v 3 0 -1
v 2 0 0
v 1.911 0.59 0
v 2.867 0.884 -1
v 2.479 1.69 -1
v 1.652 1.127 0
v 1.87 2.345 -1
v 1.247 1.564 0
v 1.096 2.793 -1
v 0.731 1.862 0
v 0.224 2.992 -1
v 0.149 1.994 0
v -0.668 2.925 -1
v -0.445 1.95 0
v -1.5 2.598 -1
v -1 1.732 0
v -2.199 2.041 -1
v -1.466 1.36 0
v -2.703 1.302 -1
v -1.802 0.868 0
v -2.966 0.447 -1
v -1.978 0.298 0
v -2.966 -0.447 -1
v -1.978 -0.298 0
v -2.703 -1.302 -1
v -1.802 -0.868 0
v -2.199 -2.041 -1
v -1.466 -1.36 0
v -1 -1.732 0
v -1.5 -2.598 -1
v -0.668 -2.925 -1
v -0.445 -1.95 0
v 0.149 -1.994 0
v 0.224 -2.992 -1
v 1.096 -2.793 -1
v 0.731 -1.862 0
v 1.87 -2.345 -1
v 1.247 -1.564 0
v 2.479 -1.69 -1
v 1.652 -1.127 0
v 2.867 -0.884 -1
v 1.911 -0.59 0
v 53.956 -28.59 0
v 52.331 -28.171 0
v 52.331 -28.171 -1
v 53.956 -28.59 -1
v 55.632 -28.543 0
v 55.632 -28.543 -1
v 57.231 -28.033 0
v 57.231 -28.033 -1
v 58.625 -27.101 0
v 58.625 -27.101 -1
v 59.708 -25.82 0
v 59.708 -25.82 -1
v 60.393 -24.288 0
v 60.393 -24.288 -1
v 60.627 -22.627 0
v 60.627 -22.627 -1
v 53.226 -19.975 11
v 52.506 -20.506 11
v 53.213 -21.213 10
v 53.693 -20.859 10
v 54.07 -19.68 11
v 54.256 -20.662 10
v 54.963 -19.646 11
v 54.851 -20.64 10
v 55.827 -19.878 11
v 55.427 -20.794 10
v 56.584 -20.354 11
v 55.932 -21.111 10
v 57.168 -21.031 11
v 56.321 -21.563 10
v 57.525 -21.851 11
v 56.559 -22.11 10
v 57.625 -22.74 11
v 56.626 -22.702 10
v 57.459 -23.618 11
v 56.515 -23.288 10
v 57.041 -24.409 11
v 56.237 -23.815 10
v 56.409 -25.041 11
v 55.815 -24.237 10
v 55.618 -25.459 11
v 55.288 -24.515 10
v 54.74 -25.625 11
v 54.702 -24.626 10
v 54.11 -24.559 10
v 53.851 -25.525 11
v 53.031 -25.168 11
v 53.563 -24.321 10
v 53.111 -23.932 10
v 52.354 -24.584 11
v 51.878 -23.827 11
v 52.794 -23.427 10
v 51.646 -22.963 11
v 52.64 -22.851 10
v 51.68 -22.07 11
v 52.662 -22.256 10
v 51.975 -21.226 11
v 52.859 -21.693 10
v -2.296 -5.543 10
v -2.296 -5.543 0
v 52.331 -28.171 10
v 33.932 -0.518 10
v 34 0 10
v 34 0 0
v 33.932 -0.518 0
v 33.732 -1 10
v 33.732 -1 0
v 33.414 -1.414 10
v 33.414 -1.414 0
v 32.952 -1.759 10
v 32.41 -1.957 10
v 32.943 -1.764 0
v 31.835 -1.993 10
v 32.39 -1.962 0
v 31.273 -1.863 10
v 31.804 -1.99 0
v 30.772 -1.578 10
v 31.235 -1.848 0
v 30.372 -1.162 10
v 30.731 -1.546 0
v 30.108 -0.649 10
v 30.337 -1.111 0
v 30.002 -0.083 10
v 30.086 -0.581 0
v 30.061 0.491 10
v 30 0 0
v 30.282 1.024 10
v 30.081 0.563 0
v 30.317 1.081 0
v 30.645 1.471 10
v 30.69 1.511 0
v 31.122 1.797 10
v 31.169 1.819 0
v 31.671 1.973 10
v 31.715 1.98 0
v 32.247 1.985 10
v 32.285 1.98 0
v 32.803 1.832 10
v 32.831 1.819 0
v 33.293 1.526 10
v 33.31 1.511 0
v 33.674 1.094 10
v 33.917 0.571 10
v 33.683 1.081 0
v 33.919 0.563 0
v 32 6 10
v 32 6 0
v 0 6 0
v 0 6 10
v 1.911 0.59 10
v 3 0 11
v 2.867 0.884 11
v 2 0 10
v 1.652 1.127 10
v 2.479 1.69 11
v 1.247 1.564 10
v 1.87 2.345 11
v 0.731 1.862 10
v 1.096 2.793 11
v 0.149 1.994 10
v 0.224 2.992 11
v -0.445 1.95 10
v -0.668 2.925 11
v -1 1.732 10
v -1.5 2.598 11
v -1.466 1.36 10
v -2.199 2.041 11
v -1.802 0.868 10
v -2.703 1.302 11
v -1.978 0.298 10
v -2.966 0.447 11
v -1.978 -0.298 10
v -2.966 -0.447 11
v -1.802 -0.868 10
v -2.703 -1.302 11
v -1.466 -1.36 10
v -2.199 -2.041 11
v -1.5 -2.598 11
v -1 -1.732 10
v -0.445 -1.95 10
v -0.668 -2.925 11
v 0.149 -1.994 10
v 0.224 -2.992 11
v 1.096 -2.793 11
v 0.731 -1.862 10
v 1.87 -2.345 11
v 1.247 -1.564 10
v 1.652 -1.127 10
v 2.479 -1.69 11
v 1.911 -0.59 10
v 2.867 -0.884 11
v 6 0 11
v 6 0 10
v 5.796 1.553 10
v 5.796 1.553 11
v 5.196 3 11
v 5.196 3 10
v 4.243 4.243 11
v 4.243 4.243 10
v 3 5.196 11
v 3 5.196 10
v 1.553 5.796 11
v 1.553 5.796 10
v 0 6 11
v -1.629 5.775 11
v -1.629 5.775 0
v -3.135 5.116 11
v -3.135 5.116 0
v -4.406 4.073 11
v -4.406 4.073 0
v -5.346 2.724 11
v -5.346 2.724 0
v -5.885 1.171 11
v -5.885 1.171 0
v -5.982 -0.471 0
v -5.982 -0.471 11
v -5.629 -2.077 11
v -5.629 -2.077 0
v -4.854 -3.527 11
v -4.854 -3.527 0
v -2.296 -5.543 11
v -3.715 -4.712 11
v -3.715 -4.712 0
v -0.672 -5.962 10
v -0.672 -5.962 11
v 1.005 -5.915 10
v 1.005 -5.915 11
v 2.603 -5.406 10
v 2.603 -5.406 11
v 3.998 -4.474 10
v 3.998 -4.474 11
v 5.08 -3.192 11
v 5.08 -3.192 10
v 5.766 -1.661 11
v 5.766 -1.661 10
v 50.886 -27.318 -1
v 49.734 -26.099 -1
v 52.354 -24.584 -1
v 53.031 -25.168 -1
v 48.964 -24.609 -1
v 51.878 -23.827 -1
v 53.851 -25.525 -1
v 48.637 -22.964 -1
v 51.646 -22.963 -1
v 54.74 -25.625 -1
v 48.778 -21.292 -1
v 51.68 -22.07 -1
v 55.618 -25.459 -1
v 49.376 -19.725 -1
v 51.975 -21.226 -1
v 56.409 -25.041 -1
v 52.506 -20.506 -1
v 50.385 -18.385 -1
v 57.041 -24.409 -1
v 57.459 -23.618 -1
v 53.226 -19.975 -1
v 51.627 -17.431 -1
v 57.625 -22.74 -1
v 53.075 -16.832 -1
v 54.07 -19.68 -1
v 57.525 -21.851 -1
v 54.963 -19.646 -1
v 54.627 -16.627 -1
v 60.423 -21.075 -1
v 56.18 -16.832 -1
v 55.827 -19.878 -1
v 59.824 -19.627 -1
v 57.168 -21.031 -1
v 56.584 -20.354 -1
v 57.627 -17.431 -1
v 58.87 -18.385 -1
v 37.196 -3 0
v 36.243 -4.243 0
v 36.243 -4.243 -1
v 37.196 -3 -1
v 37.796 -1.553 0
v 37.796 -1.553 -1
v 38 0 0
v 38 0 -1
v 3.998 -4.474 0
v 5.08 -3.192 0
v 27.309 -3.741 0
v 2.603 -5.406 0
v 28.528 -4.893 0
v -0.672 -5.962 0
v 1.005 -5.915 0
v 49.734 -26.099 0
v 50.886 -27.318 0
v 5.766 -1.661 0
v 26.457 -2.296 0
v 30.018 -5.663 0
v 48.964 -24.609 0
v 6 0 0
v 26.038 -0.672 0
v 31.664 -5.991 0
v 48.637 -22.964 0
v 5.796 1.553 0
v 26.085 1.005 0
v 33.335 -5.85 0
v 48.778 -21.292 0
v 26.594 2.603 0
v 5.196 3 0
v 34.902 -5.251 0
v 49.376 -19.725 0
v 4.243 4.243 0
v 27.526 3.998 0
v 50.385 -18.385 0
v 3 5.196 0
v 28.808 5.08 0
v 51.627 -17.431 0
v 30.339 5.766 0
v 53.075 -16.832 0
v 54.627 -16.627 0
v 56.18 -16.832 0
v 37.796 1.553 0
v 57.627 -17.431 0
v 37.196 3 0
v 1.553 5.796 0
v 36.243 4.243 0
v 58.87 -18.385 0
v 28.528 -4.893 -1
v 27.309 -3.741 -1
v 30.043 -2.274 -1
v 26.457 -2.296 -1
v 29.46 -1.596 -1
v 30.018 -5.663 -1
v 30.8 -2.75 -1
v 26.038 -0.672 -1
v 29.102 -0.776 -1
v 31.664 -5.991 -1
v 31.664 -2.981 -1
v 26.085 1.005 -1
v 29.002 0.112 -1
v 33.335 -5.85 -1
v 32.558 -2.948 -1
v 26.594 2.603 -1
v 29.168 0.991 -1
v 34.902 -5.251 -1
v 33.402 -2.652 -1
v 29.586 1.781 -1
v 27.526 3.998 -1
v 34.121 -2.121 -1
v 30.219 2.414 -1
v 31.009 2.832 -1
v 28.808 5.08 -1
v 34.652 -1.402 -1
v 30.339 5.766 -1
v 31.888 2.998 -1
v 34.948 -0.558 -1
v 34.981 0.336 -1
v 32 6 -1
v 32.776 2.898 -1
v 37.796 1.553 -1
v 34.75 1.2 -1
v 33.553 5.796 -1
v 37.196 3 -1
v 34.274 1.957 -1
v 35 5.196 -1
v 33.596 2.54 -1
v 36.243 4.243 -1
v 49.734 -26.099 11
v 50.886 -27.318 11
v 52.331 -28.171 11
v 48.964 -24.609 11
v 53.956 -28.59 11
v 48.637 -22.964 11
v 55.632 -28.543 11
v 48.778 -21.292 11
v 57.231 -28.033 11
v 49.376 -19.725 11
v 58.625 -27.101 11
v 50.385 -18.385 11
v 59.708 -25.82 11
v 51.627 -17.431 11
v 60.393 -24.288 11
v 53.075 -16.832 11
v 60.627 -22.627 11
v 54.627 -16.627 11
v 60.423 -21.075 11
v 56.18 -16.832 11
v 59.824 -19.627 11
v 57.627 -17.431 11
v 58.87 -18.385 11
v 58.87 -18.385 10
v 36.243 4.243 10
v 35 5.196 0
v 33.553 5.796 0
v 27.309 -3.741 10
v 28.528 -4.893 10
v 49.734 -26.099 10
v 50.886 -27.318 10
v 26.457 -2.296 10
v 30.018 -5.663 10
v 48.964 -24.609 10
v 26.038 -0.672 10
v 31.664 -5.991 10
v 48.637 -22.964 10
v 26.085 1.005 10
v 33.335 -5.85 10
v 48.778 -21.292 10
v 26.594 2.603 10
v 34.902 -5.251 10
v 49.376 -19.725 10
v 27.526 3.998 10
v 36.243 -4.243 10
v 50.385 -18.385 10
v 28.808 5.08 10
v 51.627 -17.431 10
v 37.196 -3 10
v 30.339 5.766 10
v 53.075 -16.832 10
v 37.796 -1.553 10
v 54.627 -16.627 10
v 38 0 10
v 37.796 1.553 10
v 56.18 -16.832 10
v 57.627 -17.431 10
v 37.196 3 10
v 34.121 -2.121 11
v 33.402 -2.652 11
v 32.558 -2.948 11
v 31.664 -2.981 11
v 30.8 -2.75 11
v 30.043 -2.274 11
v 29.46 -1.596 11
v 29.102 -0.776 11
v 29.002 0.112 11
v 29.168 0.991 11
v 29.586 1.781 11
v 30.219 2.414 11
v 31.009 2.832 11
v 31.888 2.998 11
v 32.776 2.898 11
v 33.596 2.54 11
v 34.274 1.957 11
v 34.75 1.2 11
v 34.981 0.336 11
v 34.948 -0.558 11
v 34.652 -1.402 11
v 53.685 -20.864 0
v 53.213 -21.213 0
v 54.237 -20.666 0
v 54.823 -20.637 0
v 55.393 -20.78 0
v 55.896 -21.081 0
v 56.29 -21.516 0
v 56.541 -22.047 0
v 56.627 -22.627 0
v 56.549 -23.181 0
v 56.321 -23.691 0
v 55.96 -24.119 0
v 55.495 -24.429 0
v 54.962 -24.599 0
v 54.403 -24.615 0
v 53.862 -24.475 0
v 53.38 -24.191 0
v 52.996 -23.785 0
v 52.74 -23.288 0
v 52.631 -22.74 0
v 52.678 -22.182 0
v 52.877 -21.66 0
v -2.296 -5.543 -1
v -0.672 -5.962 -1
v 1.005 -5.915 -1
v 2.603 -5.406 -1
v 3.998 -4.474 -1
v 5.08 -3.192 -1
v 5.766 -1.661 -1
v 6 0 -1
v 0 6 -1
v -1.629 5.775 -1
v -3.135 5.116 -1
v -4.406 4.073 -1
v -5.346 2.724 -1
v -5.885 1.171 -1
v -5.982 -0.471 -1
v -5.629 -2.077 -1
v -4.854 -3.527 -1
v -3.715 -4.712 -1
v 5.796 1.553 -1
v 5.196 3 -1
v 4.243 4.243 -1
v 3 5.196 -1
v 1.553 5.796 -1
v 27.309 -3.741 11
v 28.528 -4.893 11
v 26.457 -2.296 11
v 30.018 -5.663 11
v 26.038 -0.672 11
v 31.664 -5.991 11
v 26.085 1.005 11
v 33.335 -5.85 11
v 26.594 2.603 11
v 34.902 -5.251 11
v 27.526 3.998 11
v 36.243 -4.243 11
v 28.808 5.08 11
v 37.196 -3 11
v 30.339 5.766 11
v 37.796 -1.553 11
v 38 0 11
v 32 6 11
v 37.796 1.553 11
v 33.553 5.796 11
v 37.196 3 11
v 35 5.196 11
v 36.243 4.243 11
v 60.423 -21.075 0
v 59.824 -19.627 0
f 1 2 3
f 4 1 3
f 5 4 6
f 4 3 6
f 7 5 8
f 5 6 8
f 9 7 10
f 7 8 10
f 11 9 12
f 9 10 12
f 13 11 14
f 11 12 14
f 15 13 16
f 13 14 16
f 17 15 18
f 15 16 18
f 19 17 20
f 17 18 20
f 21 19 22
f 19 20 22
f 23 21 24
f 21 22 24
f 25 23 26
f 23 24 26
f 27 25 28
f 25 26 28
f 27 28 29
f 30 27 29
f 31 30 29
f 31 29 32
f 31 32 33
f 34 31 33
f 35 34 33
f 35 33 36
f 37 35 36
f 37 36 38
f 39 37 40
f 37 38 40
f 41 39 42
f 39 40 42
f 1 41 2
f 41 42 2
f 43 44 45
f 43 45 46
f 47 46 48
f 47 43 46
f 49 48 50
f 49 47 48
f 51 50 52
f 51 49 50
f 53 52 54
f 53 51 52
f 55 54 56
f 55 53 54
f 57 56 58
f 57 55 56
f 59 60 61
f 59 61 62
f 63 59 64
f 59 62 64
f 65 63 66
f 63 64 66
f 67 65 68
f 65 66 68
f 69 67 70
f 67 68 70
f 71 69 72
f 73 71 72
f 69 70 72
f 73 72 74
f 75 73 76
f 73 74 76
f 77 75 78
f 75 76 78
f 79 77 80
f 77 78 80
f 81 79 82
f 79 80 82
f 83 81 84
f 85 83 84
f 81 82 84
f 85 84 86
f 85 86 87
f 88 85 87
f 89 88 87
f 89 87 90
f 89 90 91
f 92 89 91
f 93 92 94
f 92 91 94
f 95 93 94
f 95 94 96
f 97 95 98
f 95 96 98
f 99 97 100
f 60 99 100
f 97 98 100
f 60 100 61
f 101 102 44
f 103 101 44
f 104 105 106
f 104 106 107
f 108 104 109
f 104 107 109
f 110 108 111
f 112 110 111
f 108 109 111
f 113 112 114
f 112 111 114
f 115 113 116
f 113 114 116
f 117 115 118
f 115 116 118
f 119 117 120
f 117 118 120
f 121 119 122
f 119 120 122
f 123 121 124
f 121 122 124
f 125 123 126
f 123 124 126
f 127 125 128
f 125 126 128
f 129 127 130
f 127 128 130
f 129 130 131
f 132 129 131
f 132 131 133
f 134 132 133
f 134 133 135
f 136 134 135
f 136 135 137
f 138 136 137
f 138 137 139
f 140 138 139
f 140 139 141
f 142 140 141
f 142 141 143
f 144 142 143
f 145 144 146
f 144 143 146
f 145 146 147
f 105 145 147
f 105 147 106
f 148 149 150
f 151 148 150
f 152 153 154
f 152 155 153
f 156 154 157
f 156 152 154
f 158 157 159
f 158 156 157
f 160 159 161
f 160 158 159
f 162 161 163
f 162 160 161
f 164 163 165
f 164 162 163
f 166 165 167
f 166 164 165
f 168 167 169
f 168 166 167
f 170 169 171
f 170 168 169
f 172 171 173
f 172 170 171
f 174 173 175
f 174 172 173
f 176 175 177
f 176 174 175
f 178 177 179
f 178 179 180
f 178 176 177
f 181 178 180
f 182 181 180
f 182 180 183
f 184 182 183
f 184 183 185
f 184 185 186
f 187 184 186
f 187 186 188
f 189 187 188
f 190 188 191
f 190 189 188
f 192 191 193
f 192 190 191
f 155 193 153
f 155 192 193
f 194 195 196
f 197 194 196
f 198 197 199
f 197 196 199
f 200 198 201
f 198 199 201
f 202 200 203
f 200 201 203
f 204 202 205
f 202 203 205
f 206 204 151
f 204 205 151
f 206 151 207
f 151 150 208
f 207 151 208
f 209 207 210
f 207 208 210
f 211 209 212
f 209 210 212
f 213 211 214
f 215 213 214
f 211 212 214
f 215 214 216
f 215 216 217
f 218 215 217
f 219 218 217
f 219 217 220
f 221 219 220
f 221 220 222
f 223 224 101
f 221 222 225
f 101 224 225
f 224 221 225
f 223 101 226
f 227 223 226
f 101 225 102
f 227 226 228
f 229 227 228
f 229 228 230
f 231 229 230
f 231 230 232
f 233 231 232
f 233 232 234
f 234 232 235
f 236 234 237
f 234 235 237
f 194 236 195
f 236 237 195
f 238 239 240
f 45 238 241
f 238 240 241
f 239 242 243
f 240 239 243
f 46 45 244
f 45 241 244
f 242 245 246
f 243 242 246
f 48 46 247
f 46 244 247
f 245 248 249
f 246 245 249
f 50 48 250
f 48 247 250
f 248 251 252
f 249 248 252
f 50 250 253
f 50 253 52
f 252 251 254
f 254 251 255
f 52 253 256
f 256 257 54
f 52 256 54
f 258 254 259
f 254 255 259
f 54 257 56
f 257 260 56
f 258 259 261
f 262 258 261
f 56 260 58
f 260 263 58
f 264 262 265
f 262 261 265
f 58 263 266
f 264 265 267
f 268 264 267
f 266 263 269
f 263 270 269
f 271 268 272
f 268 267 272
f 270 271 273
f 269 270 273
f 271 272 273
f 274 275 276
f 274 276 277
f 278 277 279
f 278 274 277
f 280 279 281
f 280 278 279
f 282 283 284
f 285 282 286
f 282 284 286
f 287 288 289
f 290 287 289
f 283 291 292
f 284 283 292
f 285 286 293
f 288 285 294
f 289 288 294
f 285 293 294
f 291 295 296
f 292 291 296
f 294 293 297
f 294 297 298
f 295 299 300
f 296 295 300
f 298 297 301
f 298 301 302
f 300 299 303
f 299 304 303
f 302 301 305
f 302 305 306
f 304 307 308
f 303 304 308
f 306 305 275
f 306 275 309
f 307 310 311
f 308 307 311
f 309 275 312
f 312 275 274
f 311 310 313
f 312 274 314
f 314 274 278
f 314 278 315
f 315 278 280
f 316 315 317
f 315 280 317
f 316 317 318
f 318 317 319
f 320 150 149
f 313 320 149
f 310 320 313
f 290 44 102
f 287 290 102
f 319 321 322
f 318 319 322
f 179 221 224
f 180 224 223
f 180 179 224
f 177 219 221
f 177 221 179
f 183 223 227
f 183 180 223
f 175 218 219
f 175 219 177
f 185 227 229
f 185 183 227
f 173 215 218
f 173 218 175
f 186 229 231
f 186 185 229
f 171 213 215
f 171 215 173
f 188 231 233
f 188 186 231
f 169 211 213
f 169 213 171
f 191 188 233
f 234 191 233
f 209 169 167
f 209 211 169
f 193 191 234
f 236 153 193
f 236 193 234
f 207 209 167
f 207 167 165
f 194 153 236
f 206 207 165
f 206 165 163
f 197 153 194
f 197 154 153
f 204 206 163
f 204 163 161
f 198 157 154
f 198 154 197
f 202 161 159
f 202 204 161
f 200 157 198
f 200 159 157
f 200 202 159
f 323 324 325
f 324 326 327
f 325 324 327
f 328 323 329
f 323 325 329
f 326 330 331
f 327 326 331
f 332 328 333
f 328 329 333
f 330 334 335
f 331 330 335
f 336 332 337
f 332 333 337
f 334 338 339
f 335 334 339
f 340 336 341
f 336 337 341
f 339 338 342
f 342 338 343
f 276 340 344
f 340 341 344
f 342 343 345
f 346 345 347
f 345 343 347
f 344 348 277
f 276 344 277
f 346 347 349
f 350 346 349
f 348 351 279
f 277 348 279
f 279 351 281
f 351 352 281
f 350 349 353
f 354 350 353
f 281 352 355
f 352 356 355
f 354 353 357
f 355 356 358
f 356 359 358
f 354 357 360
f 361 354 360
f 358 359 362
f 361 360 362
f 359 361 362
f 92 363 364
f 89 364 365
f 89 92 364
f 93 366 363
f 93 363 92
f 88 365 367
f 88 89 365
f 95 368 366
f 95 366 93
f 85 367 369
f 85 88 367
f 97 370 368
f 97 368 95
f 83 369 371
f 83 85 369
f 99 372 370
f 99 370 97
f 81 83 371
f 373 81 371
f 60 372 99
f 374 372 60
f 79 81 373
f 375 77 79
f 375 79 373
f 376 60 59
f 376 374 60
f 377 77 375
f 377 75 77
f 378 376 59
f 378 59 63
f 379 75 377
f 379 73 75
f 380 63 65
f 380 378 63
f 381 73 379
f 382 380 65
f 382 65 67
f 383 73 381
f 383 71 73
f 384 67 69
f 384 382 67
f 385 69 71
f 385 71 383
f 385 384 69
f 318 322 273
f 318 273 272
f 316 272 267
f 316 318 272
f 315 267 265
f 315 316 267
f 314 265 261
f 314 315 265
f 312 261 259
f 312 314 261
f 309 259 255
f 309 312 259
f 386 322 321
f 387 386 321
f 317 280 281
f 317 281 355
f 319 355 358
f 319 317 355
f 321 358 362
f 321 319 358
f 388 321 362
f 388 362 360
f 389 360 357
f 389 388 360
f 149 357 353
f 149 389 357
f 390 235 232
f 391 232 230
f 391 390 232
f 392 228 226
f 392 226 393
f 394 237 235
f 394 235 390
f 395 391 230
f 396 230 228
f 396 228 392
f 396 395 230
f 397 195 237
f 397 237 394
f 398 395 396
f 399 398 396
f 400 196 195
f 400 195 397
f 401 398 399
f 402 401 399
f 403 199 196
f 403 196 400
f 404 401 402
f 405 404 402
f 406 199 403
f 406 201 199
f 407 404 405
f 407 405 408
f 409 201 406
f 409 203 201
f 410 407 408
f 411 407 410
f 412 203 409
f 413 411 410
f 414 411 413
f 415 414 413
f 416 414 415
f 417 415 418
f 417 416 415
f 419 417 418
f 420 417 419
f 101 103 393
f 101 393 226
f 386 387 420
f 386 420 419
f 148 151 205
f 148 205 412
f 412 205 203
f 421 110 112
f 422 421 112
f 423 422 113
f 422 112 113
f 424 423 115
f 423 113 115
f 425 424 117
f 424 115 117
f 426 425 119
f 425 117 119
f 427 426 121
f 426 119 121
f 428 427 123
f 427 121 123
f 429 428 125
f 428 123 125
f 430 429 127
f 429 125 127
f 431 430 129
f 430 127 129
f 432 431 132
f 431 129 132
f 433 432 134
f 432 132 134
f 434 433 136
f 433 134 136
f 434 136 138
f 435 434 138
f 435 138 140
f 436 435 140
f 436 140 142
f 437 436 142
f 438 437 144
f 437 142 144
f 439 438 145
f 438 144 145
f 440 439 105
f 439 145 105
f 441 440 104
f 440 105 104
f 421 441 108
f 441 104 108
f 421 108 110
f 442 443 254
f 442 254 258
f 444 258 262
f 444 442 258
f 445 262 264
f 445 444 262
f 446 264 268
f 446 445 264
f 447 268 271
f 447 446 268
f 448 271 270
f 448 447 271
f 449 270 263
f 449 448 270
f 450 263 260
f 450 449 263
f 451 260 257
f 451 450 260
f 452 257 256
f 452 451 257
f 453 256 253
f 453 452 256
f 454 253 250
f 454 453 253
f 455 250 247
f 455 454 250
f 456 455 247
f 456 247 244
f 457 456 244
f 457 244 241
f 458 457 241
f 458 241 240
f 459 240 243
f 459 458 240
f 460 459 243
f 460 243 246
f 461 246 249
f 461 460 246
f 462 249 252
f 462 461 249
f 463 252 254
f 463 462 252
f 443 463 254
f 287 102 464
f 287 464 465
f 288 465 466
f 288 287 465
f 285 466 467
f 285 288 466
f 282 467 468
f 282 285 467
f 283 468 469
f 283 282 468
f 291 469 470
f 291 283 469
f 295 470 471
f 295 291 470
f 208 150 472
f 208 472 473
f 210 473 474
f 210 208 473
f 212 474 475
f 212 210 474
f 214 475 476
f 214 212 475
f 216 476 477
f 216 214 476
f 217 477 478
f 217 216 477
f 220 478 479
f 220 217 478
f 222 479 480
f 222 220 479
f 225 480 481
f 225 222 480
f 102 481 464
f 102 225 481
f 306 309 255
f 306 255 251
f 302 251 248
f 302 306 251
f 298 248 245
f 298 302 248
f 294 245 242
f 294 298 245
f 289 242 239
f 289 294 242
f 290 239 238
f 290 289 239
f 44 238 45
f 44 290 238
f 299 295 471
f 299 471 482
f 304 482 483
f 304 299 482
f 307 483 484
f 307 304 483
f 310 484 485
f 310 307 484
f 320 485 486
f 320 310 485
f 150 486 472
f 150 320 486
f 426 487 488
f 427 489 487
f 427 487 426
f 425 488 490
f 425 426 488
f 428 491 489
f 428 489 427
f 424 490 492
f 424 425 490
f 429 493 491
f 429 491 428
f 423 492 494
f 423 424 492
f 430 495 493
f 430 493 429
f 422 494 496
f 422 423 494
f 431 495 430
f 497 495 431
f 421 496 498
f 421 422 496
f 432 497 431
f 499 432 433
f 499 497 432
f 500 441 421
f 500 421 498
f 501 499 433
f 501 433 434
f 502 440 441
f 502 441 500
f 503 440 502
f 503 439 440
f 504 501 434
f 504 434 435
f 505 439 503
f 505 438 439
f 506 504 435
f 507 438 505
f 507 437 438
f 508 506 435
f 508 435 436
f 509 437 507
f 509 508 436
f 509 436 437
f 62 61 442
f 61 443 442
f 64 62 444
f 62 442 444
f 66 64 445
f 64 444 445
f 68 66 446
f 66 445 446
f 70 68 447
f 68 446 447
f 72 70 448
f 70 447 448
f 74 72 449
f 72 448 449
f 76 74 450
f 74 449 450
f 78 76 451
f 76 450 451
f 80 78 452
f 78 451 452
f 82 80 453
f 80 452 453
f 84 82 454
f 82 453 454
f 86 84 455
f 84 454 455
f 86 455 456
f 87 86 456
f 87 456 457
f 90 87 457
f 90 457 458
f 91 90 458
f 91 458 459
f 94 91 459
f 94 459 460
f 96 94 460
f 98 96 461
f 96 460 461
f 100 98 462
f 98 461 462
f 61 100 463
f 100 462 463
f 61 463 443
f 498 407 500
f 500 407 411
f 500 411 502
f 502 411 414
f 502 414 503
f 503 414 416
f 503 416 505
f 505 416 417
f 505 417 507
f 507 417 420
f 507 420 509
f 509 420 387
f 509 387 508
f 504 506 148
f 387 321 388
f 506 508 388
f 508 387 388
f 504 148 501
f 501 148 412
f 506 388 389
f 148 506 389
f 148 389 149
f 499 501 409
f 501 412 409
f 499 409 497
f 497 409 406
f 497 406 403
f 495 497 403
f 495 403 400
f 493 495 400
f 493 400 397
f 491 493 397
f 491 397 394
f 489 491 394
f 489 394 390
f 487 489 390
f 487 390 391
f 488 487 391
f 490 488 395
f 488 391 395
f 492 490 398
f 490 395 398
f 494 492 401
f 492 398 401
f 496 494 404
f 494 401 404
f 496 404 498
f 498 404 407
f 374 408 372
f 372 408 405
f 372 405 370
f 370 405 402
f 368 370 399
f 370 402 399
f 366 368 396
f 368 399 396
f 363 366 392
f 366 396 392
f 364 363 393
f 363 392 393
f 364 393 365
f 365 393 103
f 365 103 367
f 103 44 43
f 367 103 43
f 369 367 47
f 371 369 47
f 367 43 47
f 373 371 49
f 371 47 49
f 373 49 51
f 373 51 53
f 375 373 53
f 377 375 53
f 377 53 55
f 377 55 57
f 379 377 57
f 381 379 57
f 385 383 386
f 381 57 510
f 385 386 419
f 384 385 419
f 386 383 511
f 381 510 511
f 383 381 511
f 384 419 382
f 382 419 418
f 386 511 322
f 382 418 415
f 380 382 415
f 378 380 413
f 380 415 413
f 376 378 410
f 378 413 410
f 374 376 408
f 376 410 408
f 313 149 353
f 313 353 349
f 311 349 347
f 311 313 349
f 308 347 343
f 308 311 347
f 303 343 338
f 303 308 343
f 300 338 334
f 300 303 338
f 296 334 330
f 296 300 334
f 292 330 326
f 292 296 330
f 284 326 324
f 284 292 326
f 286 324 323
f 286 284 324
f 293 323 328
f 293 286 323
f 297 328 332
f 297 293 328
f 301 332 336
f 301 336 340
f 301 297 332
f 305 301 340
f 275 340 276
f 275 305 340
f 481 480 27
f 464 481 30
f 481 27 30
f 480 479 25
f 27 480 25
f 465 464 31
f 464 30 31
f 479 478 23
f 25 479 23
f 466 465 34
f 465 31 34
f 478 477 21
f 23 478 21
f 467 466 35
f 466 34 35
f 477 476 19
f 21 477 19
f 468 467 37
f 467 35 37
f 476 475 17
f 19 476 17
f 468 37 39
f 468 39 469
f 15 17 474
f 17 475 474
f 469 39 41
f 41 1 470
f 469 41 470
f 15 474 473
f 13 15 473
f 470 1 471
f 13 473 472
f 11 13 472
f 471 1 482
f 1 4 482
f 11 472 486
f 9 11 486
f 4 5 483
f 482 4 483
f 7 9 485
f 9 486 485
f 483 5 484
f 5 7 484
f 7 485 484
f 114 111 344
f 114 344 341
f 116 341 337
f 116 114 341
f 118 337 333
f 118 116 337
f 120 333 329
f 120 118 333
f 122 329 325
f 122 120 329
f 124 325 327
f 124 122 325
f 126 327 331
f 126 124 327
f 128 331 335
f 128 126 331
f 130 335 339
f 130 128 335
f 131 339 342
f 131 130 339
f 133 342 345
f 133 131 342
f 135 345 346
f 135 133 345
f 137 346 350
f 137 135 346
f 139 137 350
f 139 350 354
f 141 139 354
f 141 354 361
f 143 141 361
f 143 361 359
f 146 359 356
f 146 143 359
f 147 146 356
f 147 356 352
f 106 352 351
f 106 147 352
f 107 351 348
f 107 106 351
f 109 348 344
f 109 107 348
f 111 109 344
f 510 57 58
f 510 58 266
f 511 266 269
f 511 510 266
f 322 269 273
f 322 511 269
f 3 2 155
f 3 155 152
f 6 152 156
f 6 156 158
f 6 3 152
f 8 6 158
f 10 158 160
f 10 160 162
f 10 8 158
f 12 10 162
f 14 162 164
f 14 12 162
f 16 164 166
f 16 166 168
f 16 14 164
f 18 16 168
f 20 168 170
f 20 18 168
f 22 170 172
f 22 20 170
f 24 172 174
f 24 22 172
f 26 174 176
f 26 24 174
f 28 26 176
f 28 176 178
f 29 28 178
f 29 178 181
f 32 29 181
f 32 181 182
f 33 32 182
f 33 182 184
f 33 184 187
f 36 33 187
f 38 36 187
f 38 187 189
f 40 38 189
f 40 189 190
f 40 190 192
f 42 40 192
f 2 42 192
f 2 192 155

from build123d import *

# Parameters (mm, degrees)
F0_R     = 2
F1_DEPTH = 10
F2_DEPTH = 11
F3_DEPTH = 1


# Not quite as in the source:
# - a fillet or chamfer that OpenCascade refuses, or shapes differently, is made with other operations: its cross-section is extruded or revolved along the edge and cut away or added
# - after a boolean that leaves OpenCascade's solid faulty, fix() repairs it


with BuildPart() as f1:
    # F0 (on Top) → F1 (new body)
    with BuildSketch(Plane.XY):
        with BuildLine():
            Line((26, 0), (6, 0))
            ThreePointArc((6, 0), (3.3334213981, -4.9888176738), (-2.2961005942, -5.5432771951))
            Line((-2.2961005942, -5.5432771951), (52.3313164038, -28.170694193))
            ThreePointArc((52.3313164038, -28.170694193), (48.7427053156, -23.7979589301), (50.3847763109, -18.3847763109))
            Line((50.3847763109, -18.3847763109), (36.2426406871, -4.2426406871))
            ThreePointArc((36.2426406871, -4.2426406871), (29.7038994058, -5.5432771951), (26, 0))
        make_face()
        with BuildLine():
            ThreePointArc((0, 6), (4.2426406871, 4.2426406871), (6, 0))
            Line((6, 0), (26, 0))
            ThreePointArc((26, 0), (27.7573593129, 4.2426406871), (32, 6))
            Line((32, 6), (0, 6))
        make_face()
        with BuildLine():
            ThreePointArc((38, 0), (37.5432771951, -2.2961005942), (36.2426406871, -4.2426406871))
            Line((36.2426406871, -4.2426406871), (50.3847763109, -18.3847763109))
            ThreePointArc((50.3847763109, -18.3847763109), (54.627416998, -16.627416998), (58.8700576851, -18.3847763109))
            Line((58.8700576851, -18.3847763109), (36.2426406871, 4.2426406871))
            ThreePointArc((36.2426406871, 4.2426406871), (37.5432771951, 2.2961005942), (38, 0))
        make_face()
        with BuildLine():
            ThreePointArc((-2.2961005942, -5.5432771951), (3.3334213981, -4.9888176738), (6, 0))
            ThreePointArc((6, 0), (4.2426406871, 4.2426406871), (0, 6))
            ThreePointArc((0, 6), (-5.8847116824, 1.1705419321), (-2.2961005942, -5.5432771951))
        make_face()
        Circle(F0_R, mode=Mode.SUBTRACT)
        with BuildLine():
            Line((30, 0), (26, 0))
            ThreePointArc((26, 0), (29.7038994058, -5.5432771951), (36.2426406871, -4.2426406871))
            Line((36.2426406871, -4.2426406871), (33.4142135624, -1.4142135624))
            ThreePointArc((33.4142135624, -1.4142135624), (31.2346331353, -1.847759065), (30, 0))
        make_face()
        with BuildLine():
            ThreePointArc((32, 6), (27.7573593129, 4.2426406871), (26, 0))
            Line((26, 0), (30, 0))
            ThreePointArc((30, 0), (32, 2), (34, 0))
            ThreePointArc((34, 0), (33.847759065, -0.7653668647), (33.4142135624, -1.4142135624))
            Line((33.4142135624, -1.4142135624), (36.2426406871, -4.2426406871))
            ThreePointArc((36.2426406871, -4.2426406871), (37.5432771951, -2.2961005942), (38, 0))
            ThreePointArc((38, 0), (37.5432771951, 2.2961005942), (36.2426406871, 4.2426406871))
            ThreePointArc((36.2426406871, 4.2426406871), (34.2961005942, 5.5432771951), (32, 6))
        make_face()
        with BuildLine():
            ThreePointArc((50.3847763109, -18.3847763109), (48.7427053156, -23.7979589301), (52.3313164038, -28.170694193))
            ThreePointArc((52.3313164038, -28.170694193), (57.9608383961, -27.6162346718), (60.627416998, -22.627416998))
            ThreePointArc((60.627416998, -22.627416998), (60.170694193, -20.3313164038), (58.8700576851, -18.3847763109))
            ThreePointArc((58.8700576851, -18.3847763109), (54.627416998, -16.627416998), (50.3847763109, -18.3847763109))
        make_face()
        with BuildLine():
            ThreePointArc((56.627416998, -22.627416998), (53.8620501332, -24.475176063), (53.2132034356, -21.2132034356))
            ThreePointArc((53.2132034356, -21.2132034356), (55.3927838627, -20.7796579329), (56.627416998, -22.627416998))
        make_face(mode=Mode.SUBTRACT)
    extrude(amount=F1_DEPTH)

    # F0 (on Top) → F2 (join)
    with BuildSketch(Plane.XY):
        with BuildLine():
            ThreePointArc((-2.2961005942, -5.5432771951), (3.3334213981, -4.9888176738), (6, 0))
            ThreePointArc((6, 0), (4.2426406871, 4.2426406871), (0, 6))
            ThreePointArc((0, 6), (-5.8847116824, 1.1705419321), (-2.2961005942, -5.5432771951))
        make_face()
        Circle(F0_R, mode=Mode.SUBTRACT)
        with BuildLine():
            ThreePointArc((32, 6), (27.7573593129, 4.2426406871), (26, 0))
            Line((26, 0), (30, 0))
            ThreePointArc((30, 0), (32, 2), (34, 0))
            ThreePointArc((34, 0), (33.847759065, -0.7653668647), (33.4142135624, -1.4142135624))
            Line((33.4142135624, -1.4142135624), (36.2426406871, -4.2426406871))
            ThreePointArc((36.2426406871, -4.2426406871), (37.5432771951, -2.2961005942), (38, 0))
            ThreePointArc((38, 0), (37.5432771951, 2.2961005942), (36.2426406871, 4.2426406871))
            ThreePointArc((36.2426406871, 4.2426406871), (34.2961005942, 5.5432771951), (32, 6))
        make_face()
        with BuildLine():
            Line((30, 0), (26, 0))
            ThreePointArc((26, 0), (29.7038994058, -5.5432771951), (36.2426406871, -4.2426406871))
            Line((36.2426406871, -4.2426406871), (33.4142135624, -1.4142135624))
            ThreePointArc((33.4142135624, -1.4142135624), (31.2346331353, -1.847759065), (30, 0))
        make_face()
        with BuildLine():
            ThreePointArc((50.3847763109, -18.3847763109), (48.7427053156, -23.7979589301), (52.3313164038, -28.170694193))
            ThreePointArc((52.3313164038, -28.170694193), (57.9608383961, -27.6162346718), (60.627416998, -22.627416998))
            ThreePointArc((60.627416998, -22.627416998), (60.170694193, -20.3313164038), (58.8700576851, -18.3847763109))
            ThreePointArc((58.8700576851, -18.3847763109), (54.627416998, -16.627416998), (50.3847763109, -18.3847763109))
        make_face()
        with BuildLine():
            ThreePointArc((56.627416998, -22.627416998), (53.8620501332, -24.475176063), (53.2132034356, -21.2132034356))
            ThreePointArc((53.2132034356, -21.2132034356), (55.3927838627, -20.7796579329), (56.627416998, -22.627416998))
        make_face(mode=Mode.SUBTRACT)
    extrude(amount=F2_DEPTH)

    # F0 (on Top) → F3 (join)
    with BuildSketch(Plane.XY):
        with BuildLine():
            ThreePointArc((-2.2961005942, -5.5432771951), (3.3334213981, -4.9888176738), (6, 0))
            ThreePointArc((6, 0), (4.2426406871, 4.2426406871), (0, 6))
            ThreePointArc((0, 6), (-5.8847116824, 1.1705419321), (-2.2961005942, -5.5432771951))
        make_face()
        Circle(F0_R, mode=Mode.SUBTRACT)
        with BuildLine():
            ThreePointArc((32, 6), (27.7573593129, 4.2426406871), (26, 0))
            Line((26, 0), (30, 0))
            ThreePointArc((30, 0), (32, 2), (34, 0))
            ThreePointArc((34, 0), (33.847759065, -0.7653668647), (33.4142135624, -1.4142135624))
            Line((33.4142135624, -1.4142135624), (36.2426406871, -4.2426406871))
            ThreePointArc((36.2426406871, -4.2426406871), (37.5432771951, -2.2961005942), (38, 0))
            ThreePointArc((38, 0), (37.5432771951, 2.2961005942), (36.2426406871, 4.2426406871))
            ThreePointArc((36.2426406871, 4.2426406871), (34.2961005942, 5.5432771951), (32, 6))
        make_face()
        with BuildLine():
            Line((30, 0), (26, 0))
            ThreePointArc((26, 0), (29.7038994058, -5.5432771951), (36.2426406871, -4.2426406871))
            Line((36.2426406871, -4.2426406871), (33.4142135624, -1.4142135624))
            ThreePointArc((33.4142135624, -1.4142135624), (31.2346331353, -1.847759065), (30, 0))
        make_face()
        with BuildLine():
            ThreePointArc((50.3847763109, -18.3847763109), (48.7427053156, -23.7979589301), (52.3313164038, -28.170694193))
            ThreePointArc((52.3313164038, -28.170694193), (57.9608383961, -27.6162346718), (60.627416998, -22.627416998))
            ThreePointArc((60.627416998, -22.627416998), (60.170694193, -20.3313164038), (58.8700576851, -18.3847763109))
            ThreePointArc((58.8700576851, -18.3847763109), (54.627416998, -16.627416998), (50.3847763109, -18.3847763109))
        make_face()
        with BuildLine():
            ThreePointArc((56.627416998, -22.627416998), (53.8620501332, -24.475176063), (53.2132034356, -21.2132034356))
            ThreePointArc((53.2132034356, -21.2132034356), (55.3927838627, -20.7796579329), (56.627416998, -22.627416998))
        make_face(mode=Mode.SUBTRACT)
    extrude(amount=-F3_DEPTH)

    add(f1.part.fix(), mode=Mode.REPLACE)

    # F4: chamfer of 1 on 6 edges, made by hand

    # F4_s1 → F4_t2 (revolve, cut)
    with BuildSketch(Plane.XZ):
        Polygon((3, 11), (2, 10), (2, 11), align=None)
    revolve(axis=Axis((0, 0, 11), (0, 0, 1)), mode=Mode.SUBTRACT)

    # F4_s3 → F4_t4 (revolve, cut)
    with BuildSketch(Plane(origin=(16, 16, 0), x_dir=(0, 0, 1), z_dir=(0.7071067812, 0.7071067812, 0))):
        Polygon((11, 25.627416998), (10, 24.627416998), (11, 24.627416998), align=None)
    revolve(axis=Axis((32, 0, 11), (0, 0, -1)), mode=Mode.SUBTRACT)

    # F4_s5 → F4_t6 (revolve, cut)
    with BuildSketch(Plane(origin=(16, 16, 0), x_dir=(0, 0, 1), z_dir=(-0.7071067812, -0.7071067812, 0))):
        Polygon((11, -51.627416998), (10, -52.627416998), (11, -52.627416998), align=None)
    revolve(axis=Axis((54.627416998, -22.627416998, 11), (0, 0, -1)), mode=Mode.SUBTRACT)

    # F4_s7 → F4_t8 (revolve, cut)
    with BuildSketch(Plane.XZ):
        Polygon((3, -1), (2, 0), (2, -1), align=None)
    revolve(axis=Axis((0, 0, -1), (0, 0, 1)), mode=Mode.SUBTRACT)

    # F4_s9 → F4_t10 (revolve, cut)
    with BuildSketch(Plane(origin=(16, 16, 0), x_dir=(0, 0, 1), z_dir=(0.7071067812, 0.7071067812, 0))):
        Polygon((-1, 25.627416998), (0, 24.627416998), (-1, 24.627416998), align=None)
    revolve(axis=Axis((32, 0, -1), (0, 0, -1)), mode=Mode.SUBTRACT)

    # F4_s11 → F4_t12 (revolve, cut)
    with BuildSketch(Plane(origin=(16, 16, 0), x_dir=(0, 0, 1), z_dir=(-0.7071067812, -0.7071067812, 0))):
        Polygon((-1, -51.627416998), (0, -52.627416998), (-1, -52.627416998), align=None)
    revolve(axis=Axis((54.627416998, -22.627416998, -1), (0, 0, -1)), mode=Mode.SUBTRACT)


solid = f1.part
